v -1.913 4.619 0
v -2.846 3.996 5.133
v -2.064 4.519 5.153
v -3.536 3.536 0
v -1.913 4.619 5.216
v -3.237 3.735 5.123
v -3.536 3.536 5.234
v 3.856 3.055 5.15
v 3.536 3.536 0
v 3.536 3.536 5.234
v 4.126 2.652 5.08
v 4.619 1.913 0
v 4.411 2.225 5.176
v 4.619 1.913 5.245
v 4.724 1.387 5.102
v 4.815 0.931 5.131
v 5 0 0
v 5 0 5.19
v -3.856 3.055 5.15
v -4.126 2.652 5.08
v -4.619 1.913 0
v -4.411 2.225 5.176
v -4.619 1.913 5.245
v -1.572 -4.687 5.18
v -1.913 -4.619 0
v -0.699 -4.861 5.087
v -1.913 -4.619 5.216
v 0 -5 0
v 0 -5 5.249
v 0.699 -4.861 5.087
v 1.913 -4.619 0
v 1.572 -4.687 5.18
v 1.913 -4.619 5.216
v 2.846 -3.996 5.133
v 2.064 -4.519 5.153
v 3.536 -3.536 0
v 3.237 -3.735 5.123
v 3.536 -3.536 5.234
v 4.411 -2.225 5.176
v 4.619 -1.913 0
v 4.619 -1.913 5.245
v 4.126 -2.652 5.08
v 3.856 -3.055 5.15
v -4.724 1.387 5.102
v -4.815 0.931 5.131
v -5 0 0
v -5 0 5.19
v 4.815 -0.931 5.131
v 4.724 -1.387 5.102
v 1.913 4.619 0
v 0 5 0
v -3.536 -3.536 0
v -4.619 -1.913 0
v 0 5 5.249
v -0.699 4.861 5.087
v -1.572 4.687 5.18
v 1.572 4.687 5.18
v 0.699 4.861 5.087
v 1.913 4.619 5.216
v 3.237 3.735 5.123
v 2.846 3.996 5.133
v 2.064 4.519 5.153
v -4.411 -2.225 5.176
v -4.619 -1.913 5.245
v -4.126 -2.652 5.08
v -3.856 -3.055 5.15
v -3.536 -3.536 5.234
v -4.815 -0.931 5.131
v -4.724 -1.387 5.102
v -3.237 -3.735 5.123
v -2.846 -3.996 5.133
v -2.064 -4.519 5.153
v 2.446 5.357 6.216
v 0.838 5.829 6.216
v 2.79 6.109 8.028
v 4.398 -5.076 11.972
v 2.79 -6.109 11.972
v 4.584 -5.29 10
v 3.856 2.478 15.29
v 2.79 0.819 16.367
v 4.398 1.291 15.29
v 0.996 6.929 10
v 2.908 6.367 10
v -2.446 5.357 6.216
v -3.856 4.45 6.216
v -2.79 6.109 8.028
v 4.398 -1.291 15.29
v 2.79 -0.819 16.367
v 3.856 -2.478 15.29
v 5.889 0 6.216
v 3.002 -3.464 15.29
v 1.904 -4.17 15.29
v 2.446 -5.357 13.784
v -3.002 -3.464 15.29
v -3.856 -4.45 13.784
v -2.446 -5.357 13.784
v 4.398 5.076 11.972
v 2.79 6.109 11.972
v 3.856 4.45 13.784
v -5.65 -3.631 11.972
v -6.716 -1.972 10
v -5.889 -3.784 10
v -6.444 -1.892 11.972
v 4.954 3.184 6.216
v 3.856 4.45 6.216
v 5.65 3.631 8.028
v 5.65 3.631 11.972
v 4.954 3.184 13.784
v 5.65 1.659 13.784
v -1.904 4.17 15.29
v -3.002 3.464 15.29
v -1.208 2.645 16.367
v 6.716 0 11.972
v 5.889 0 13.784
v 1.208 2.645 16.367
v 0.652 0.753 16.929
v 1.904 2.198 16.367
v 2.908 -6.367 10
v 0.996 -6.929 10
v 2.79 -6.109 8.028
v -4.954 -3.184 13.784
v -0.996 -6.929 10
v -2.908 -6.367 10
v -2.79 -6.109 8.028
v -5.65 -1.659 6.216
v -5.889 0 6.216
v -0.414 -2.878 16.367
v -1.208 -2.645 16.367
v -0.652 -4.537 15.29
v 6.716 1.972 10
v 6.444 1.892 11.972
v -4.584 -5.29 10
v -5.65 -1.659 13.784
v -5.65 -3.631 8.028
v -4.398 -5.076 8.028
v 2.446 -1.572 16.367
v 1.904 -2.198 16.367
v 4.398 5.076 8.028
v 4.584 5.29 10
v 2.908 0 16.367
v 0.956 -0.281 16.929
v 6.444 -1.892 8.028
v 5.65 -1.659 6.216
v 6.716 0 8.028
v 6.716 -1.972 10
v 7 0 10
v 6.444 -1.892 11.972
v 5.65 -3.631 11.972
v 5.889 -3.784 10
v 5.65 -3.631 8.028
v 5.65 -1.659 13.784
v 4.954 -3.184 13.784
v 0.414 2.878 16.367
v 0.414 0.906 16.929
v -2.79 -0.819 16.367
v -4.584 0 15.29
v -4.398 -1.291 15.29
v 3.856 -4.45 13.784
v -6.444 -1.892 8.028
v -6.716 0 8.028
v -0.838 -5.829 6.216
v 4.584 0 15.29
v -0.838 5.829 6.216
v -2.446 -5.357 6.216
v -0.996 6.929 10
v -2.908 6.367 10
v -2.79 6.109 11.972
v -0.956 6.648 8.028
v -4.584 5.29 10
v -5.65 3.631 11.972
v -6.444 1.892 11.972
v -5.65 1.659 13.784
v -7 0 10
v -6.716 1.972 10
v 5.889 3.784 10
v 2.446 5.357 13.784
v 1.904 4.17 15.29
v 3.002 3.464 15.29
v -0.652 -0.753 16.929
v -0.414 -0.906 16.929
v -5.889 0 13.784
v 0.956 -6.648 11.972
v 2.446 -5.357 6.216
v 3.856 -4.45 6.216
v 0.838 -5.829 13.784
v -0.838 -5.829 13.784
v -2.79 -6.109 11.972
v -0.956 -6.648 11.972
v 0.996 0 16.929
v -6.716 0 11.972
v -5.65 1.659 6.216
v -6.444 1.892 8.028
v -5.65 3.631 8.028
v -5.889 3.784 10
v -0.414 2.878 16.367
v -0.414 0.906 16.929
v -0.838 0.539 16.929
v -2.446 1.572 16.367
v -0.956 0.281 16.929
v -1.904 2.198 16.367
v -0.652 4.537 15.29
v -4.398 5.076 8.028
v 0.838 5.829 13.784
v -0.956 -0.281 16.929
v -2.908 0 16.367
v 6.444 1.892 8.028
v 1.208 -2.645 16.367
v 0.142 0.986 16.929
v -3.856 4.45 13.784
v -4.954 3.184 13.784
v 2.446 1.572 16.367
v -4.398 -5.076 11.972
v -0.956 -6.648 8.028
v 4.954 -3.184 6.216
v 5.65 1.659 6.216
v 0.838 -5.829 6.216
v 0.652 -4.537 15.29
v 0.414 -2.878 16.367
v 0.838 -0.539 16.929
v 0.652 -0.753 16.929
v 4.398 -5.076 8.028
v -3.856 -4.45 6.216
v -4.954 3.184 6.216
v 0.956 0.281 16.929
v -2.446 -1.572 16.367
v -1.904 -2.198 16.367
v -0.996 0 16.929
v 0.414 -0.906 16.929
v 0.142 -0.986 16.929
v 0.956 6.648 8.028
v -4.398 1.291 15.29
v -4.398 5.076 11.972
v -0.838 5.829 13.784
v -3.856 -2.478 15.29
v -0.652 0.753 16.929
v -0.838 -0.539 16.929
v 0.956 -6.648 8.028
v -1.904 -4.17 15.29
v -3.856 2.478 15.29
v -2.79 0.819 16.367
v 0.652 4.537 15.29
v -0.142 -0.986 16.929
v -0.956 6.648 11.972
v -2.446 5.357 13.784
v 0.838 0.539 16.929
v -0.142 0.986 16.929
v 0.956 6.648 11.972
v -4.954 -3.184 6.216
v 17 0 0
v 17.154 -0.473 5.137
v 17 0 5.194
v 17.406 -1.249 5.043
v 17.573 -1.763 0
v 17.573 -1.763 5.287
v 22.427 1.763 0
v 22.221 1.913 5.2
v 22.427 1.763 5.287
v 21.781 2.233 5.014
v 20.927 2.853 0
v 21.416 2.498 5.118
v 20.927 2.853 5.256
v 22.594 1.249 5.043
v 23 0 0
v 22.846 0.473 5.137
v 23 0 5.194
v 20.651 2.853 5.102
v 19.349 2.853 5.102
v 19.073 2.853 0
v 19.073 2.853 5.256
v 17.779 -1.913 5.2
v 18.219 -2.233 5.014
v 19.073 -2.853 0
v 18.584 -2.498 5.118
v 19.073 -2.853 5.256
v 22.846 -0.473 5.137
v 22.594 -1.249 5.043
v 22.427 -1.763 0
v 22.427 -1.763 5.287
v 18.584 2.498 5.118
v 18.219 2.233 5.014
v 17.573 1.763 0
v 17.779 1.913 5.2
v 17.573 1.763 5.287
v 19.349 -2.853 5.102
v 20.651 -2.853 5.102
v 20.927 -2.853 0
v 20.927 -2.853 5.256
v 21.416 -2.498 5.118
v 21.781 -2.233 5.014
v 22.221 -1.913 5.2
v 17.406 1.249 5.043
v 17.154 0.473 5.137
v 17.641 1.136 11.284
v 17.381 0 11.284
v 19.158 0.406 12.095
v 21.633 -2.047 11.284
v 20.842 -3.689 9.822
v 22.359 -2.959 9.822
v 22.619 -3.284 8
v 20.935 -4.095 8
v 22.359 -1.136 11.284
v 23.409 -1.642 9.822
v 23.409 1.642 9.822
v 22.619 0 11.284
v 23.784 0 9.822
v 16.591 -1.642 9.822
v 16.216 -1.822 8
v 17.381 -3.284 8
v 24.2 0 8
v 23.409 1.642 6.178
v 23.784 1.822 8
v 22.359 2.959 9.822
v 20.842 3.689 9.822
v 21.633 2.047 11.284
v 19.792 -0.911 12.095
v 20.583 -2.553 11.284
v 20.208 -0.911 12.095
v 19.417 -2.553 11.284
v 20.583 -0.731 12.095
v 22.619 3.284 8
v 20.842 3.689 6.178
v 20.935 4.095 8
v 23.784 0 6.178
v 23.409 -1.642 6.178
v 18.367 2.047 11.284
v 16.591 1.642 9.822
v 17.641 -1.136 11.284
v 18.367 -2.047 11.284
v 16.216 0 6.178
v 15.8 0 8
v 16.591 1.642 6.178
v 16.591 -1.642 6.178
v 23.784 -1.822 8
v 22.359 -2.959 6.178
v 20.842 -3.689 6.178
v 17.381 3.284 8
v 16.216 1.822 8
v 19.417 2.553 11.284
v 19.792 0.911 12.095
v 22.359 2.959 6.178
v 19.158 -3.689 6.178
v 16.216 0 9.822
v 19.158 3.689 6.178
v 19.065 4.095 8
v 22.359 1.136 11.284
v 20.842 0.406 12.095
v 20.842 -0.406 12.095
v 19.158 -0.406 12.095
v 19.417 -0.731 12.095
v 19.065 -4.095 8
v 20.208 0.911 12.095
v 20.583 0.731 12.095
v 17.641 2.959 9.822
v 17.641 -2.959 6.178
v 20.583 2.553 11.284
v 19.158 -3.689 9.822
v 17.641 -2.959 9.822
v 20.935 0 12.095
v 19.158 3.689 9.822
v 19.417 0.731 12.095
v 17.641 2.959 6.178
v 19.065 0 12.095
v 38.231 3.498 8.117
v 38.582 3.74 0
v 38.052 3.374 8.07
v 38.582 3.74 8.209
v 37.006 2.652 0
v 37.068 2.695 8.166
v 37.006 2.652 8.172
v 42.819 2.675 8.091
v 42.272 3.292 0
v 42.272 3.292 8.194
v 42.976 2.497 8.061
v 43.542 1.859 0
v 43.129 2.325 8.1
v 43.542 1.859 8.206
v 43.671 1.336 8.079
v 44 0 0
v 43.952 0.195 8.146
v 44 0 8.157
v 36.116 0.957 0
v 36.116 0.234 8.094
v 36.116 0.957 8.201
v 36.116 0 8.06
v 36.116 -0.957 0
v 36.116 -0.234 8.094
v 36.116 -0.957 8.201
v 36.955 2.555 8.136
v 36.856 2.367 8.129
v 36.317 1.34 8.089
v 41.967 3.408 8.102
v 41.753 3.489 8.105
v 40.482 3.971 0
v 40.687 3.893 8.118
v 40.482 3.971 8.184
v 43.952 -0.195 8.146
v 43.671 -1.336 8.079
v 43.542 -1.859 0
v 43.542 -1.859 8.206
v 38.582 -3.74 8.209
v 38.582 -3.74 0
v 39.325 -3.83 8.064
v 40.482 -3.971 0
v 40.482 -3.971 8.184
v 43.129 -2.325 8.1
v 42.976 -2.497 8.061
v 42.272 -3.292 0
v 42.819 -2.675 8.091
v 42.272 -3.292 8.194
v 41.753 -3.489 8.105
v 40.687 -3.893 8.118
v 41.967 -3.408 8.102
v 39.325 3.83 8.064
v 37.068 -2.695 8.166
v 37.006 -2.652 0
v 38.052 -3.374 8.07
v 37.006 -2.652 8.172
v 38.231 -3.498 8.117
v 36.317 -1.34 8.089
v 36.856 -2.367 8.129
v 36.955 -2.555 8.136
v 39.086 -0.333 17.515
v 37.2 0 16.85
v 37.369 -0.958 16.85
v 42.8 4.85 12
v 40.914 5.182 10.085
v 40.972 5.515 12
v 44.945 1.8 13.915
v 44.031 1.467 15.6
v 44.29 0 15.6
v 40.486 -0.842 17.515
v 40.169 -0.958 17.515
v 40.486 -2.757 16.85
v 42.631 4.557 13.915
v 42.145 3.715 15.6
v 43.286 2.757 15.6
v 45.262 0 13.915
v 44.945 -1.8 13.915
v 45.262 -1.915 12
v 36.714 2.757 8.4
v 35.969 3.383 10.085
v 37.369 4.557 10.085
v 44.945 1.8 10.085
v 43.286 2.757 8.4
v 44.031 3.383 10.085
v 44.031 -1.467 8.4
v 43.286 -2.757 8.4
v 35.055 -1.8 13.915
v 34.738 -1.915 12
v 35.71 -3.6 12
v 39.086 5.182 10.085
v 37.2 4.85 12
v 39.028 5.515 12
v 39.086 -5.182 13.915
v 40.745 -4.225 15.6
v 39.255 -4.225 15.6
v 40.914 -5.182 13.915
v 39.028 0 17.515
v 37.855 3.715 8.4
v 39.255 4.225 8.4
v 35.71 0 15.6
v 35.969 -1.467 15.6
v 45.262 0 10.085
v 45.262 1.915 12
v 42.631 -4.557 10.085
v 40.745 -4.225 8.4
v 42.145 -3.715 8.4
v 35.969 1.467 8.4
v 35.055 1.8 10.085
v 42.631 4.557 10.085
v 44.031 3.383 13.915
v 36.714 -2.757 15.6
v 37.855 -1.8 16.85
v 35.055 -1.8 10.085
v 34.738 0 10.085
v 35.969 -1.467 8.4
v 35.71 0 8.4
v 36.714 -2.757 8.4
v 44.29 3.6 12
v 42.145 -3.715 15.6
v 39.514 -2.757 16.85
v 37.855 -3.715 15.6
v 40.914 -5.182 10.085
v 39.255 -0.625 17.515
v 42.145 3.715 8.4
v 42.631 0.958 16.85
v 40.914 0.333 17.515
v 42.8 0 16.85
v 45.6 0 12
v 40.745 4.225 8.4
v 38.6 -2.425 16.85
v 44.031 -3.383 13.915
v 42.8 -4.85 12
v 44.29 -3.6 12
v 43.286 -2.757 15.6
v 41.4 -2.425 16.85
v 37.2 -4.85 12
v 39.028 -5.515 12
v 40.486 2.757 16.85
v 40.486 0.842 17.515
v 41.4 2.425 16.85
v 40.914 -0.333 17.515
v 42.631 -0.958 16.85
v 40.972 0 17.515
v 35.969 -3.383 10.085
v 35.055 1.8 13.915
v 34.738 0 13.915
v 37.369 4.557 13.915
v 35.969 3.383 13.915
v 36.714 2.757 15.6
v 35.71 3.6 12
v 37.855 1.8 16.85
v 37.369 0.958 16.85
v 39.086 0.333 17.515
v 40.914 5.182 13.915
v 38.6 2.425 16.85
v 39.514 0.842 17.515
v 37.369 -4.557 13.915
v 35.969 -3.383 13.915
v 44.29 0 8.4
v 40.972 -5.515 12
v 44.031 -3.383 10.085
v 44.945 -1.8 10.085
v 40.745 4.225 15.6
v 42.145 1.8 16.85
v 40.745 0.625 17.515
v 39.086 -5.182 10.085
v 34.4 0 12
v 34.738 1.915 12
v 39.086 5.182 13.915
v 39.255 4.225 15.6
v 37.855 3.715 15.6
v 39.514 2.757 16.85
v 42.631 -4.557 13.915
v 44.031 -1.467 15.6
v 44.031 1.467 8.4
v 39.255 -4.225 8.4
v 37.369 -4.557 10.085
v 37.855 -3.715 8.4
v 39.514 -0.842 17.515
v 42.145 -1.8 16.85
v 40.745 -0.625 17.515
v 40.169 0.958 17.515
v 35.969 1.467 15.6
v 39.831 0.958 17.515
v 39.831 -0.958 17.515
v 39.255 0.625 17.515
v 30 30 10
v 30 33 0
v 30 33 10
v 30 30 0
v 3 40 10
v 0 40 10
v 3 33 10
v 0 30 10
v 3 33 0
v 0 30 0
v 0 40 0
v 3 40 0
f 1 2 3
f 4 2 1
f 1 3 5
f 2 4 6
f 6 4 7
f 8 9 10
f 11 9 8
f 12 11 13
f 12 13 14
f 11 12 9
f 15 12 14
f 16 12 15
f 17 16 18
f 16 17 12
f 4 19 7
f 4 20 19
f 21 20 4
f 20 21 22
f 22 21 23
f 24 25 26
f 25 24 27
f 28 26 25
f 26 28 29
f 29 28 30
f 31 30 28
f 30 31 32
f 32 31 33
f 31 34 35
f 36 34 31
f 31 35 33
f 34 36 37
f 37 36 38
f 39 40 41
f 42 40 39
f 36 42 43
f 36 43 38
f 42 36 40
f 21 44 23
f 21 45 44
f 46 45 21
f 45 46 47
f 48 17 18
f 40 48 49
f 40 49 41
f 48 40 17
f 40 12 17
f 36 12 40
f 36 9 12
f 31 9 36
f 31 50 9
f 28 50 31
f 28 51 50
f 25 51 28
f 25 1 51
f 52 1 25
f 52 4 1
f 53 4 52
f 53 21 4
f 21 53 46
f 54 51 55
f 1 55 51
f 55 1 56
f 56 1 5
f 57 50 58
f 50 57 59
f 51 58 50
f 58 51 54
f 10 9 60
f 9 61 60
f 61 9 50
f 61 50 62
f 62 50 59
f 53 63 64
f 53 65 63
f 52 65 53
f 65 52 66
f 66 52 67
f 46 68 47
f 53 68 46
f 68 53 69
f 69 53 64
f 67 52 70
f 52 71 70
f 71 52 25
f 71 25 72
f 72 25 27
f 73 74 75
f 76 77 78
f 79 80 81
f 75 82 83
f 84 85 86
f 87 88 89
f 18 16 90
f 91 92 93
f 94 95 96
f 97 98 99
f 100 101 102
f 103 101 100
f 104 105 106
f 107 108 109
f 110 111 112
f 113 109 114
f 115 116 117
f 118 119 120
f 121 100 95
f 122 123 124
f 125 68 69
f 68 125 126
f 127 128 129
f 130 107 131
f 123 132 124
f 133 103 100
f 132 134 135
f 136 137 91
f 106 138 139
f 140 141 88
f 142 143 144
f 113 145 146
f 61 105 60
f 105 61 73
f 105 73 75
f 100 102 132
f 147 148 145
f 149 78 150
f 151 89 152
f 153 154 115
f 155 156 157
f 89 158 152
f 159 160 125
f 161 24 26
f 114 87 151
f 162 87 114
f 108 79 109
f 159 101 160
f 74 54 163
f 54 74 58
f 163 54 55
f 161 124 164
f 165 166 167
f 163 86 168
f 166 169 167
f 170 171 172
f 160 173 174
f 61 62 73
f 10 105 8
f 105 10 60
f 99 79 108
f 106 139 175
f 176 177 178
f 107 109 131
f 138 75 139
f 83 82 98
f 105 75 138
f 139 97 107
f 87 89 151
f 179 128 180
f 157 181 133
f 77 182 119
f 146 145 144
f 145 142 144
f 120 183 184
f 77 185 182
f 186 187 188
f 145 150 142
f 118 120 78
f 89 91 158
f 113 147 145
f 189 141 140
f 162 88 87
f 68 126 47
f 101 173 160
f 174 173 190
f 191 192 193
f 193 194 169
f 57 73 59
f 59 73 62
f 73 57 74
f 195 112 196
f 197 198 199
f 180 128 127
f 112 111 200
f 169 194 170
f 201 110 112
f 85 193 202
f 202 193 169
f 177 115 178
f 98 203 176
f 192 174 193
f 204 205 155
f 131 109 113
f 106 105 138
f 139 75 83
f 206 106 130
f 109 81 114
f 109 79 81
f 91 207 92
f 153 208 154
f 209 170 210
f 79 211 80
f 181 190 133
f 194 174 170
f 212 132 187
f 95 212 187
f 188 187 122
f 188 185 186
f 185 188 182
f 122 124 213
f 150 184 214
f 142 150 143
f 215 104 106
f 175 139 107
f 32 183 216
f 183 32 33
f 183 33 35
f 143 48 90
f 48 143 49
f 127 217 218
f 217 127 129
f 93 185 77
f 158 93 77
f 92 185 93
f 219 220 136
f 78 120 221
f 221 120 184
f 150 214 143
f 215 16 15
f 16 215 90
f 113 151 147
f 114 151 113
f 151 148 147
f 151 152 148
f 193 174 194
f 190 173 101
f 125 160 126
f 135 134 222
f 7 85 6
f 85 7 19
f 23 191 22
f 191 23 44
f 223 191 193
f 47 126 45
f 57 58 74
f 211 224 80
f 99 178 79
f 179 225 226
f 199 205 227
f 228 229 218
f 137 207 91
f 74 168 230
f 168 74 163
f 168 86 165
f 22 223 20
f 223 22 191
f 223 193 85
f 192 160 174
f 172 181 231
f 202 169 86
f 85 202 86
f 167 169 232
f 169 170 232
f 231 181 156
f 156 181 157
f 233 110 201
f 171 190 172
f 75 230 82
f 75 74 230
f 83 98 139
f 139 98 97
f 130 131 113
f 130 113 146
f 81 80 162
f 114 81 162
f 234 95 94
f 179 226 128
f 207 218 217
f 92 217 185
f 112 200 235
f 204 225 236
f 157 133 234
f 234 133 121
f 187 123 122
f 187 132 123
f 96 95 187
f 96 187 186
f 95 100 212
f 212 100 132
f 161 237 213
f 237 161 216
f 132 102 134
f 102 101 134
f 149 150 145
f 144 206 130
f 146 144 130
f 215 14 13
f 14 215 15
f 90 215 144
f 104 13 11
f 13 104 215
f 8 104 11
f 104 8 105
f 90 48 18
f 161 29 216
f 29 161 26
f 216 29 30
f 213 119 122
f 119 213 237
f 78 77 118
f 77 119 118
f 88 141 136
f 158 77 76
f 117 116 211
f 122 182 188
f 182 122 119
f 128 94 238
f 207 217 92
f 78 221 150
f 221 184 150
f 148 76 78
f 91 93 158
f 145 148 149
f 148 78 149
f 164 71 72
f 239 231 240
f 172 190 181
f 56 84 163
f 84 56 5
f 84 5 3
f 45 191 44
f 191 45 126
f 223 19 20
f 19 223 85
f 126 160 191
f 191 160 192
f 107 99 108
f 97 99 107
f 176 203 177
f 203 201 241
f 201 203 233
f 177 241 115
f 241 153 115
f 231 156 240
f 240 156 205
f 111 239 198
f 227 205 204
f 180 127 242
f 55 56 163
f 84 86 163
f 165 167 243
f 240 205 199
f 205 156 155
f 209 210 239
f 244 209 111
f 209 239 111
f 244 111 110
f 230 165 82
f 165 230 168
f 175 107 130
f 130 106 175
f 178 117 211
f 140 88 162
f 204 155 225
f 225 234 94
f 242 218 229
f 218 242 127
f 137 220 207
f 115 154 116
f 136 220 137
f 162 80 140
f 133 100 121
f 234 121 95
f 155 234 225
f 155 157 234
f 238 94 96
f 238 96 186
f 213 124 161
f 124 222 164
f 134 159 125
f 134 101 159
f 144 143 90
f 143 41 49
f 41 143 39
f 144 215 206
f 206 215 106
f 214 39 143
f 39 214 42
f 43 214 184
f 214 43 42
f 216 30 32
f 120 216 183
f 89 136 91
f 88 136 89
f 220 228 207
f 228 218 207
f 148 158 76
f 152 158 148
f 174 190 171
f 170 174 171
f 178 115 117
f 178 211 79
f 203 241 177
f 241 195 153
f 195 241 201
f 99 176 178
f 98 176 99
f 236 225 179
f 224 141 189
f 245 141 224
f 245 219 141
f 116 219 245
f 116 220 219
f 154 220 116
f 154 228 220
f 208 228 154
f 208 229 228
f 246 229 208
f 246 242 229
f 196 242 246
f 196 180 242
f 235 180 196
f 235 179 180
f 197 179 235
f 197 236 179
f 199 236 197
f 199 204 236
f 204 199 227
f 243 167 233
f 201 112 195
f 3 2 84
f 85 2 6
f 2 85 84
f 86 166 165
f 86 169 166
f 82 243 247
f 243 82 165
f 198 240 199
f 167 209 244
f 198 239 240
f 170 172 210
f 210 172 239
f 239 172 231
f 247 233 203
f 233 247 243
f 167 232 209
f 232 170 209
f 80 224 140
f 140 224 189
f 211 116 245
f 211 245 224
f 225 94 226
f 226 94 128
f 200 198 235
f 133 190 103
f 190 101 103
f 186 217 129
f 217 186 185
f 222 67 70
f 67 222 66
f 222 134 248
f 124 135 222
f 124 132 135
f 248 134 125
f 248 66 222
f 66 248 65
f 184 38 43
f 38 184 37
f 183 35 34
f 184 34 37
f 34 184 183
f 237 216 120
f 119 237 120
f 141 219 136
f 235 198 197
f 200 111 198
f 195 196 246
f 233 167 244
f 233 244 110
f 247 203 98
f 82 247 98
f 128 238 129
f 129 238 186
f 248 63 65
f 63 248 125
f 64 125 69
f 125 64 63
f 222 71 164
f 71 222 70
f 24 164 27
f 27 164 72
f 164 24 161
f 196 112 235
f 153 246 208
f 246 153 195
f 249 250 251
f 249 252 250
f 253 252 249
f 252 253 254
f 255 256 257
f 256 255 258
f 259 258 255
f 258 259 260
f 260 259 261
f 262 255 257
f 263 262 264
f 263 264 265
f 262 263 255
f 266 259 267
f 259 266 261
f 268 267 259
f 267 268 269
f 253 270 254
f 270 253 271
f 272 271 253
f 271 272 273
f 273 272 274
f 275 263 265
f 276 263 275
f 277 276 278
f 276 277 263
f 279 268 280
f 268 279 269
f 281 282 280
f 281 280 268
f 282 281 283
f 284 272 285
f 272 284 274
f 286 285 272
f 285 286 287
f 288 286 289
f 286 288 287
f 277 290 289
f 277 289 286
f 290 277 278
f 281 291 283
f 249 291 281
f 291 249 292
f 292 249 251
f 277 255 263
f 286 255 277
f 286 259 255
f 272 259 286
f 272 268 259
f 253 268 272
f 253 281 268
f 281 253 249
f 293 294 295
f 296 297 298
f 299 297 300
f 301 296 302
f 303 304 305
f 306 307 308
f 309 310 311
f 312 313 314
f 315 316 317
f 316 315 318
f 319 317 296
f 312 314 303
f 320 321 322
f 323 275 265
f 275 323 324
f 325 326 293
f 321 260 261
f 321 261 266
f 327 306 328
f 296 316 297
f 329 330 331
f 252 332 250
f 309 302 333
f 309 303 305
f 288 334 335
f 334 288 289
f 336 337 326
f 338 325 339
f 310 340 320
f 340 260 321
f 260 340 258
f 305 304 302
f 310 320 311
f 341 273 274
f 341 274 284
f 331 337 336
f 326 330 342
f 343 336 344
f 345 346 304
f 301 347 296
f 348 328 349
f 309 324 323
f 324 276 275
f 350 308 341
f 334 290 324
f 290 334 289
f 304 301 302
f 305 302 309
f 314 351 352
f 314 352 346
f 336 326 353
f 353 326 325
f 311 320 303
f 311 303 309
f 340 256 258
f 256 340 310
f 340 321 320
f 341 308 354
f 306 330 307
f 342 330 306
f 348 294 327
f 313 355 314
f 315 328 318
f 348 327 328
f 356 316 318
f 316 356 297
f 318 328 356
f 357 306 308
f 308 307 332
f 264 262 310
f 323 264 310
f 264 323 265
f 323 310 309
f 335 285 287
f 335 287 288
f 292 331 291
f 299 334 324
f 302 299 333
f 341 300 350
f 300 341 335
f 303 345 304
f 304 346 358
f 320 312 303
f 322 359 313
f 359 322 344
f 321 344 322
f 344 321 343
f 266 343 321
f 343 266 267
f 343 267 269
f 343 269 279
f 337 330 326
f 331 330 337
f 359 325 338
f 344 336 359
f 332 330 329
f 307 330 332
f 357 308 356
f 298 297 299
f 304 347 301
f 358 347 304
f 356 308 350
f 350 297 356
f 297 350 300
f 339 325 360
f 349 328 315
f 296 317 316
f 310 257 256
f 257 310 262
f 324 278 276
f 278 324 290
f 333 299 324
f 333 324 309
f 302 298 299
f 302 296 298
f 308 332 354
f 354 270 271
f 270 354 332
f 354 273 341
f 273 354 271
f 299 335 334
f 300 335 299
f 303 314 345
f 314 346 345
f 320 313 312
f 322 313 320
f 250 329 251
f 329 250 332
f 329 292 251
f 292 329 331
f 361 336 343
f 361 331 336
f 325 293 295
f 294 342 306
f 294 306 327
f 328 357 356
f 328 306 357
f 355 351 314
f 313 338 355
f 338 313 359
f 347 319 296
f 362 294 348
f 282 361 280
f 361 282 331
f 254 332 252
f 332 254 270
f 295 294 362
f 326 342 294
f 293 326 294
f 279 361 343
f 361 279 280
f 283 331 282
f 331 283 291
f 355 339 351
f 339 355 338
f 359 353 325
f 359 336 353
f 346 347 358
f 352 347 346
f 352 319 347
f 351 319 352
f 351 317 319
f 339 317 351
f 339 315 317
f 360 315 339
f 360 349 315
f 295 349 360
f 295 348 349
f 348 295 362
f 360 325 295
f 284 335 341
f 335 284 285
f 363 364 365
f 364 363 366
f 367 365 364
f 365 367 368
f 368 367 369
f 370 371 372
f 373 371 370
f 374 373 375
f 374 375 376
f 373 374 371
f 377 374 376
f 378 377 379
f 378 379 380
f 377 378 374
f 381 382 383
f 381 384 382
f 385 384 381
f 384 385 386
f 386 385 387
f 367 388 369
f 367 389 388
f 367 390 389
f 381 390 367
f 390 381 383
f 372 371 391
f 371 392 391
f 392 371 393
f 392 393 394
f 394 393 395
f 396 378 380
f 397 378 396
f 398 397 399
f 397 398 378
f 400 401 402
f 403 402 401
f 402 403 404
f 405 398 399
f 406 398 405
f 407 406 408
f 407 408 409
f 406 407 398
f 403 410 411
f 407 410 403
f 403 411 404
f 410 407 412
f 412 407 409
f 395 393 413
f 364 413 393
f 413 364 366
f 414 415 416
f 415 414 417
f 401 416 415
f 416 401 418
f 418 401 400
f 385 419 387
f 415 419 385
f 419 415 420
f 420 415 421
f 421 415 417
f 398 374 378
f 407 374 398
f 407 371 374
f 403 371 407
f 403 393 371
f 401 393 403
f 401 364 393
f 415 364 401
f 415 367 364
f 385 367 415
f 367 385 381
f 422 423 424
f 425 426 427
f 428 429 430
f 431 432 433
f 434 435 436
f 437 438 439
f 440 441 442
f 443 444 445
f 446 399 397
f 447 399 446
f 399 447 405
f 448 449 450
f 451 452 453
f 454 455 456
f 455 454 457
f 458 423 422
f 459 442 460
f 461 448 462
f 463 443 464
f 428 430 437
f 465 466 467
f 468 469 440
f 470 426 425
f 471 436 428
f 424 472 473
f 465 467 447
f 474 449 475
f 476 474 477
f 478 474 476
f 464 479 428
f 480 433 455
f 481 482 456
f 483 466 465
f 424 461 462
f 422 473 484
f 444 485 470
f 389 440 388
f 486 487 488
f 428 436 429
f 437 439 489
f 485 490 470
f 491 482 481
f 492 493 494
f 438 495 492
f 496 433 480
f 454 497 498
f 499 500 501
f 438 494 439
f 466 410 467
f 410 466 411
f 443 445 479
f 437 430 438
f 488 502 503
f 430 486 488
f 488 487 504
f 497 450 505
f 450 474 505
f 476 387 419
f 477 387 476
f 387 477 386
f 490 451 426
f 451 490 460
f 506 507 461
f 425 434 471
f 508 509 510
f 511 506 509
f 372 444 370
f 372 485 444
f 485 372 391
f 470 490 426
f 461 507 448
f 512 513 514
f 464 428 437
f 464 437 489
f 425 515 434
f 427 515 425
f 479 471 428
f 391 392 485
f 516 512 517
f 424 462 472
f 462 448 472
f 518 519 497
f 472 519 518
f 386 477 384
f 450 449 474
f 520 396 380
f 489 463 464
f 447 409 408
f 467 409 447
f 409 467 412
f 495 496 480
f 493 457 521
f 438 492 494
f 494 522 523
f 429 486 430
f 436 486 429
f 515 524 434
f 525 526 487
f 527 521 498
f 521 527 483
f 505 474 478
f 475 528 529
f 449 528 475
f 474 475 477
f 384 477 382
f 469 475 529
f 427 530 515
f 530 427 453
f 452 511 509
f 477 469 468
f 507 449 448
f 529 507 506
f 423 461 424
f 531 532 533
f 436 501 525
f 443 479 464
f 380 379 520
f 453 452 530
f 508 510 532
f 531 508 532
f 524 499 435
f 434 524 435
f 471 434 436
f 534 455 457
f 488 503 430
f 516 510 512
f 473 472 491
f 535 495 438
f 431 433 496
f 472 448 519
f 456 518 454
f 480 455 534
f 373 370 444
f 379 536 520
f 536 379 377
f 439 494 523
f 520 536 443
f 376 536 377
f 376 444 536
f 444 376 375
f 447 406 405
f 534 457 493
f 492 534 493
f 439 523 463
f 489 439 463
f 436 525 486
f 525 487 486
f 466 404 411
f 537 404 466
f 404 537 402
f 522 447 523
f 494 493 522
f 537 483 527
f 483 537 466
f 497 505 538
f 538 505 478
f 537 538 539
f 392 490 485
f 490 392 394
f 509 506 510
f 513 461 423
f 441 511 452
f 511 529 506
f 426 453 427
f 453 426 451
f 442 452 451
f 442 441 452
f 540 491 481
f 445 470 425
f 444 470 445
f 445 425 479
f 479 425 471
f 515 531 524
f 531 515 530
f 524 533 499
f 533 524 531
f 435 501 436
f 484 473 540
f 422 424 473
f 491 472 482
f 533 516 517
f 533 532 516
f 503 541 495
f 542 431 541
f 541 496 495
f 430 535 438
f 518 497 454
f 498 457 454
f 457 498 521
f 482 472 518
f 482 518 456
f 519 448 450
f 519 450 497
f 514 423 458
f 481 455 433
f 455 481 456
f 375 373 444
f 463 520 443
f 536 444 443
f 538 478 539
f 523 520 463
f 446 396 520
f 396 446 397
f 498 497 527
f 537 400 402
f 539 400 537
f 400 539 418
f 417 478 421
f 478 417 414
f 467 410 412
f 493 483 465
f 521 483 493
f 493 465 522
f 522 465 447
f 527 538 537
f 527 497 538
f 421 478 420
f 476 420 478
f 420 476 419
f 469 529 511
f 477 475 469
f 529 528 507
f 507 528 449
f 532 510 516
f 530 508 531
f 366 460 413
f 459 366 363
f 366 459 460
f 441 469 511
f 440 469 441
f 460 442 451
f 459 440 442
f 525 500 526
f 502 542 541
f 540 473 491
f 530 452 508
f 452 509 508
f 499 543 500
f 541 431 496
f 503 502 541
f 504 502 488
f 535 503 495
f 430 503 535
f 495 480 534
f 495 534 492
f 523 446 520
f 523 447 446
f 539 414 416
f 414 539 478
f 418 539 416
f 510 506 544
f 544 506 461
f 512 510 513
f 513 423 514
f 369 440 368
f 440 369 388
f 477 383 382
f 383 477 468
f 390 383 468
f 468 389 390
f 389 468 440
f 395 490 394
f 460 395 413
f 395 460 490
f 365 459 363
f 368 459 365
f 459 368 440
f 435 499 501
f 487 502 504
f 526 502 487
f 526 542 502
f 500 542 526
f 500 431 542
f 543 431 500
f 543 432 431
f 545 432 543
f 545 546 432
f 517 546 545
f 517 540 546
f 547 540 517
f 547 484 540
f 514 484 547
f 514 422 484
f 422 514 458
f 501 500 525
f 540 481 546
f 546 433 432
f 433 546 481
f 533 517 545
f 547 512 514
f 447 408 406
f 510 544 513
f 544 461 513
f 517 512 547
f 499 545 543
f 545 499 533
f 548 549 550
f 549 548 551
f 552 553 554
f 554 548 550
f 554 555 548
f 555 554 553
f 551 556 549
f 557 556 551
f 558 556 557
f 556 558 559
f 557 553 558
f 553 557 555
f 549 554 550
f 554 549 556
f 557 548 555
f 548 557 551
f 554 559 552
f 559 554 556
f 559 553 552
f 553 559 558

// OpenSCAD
// TEST 10: Module definitions and calls
// Expected tree: module definitions + 3 call instances.
// Check: positional args map correctly (bolt(5, 10) => r=5, h=10).
// Check: named args work (bolt(h=8, r=3)).
// Check: default params used when arg omitted.

module bolt(r=4, h=12) {
    cylinder(h=h, r=r);
    translate([0, 0, h]) {
        sphere(r=r*1.4);
    }
}

module bracket(w=20, d=10, t=3) {
    union() {
        cube([w, t, d]);
        cube([t, d, d]);
    }
}

// positional call
translate([0, 0, 0]) {
    bolt(5, 10);
}

// named call — different order
translate([20, 0, 0]) {
    bolt(h=8, r=3);
}

// defaults only
translate([40, 0, 0]) {
    bolt();
}

// bracket with partial named args
translate([0, 30, 0]) {
    bracket(w=30);
}
